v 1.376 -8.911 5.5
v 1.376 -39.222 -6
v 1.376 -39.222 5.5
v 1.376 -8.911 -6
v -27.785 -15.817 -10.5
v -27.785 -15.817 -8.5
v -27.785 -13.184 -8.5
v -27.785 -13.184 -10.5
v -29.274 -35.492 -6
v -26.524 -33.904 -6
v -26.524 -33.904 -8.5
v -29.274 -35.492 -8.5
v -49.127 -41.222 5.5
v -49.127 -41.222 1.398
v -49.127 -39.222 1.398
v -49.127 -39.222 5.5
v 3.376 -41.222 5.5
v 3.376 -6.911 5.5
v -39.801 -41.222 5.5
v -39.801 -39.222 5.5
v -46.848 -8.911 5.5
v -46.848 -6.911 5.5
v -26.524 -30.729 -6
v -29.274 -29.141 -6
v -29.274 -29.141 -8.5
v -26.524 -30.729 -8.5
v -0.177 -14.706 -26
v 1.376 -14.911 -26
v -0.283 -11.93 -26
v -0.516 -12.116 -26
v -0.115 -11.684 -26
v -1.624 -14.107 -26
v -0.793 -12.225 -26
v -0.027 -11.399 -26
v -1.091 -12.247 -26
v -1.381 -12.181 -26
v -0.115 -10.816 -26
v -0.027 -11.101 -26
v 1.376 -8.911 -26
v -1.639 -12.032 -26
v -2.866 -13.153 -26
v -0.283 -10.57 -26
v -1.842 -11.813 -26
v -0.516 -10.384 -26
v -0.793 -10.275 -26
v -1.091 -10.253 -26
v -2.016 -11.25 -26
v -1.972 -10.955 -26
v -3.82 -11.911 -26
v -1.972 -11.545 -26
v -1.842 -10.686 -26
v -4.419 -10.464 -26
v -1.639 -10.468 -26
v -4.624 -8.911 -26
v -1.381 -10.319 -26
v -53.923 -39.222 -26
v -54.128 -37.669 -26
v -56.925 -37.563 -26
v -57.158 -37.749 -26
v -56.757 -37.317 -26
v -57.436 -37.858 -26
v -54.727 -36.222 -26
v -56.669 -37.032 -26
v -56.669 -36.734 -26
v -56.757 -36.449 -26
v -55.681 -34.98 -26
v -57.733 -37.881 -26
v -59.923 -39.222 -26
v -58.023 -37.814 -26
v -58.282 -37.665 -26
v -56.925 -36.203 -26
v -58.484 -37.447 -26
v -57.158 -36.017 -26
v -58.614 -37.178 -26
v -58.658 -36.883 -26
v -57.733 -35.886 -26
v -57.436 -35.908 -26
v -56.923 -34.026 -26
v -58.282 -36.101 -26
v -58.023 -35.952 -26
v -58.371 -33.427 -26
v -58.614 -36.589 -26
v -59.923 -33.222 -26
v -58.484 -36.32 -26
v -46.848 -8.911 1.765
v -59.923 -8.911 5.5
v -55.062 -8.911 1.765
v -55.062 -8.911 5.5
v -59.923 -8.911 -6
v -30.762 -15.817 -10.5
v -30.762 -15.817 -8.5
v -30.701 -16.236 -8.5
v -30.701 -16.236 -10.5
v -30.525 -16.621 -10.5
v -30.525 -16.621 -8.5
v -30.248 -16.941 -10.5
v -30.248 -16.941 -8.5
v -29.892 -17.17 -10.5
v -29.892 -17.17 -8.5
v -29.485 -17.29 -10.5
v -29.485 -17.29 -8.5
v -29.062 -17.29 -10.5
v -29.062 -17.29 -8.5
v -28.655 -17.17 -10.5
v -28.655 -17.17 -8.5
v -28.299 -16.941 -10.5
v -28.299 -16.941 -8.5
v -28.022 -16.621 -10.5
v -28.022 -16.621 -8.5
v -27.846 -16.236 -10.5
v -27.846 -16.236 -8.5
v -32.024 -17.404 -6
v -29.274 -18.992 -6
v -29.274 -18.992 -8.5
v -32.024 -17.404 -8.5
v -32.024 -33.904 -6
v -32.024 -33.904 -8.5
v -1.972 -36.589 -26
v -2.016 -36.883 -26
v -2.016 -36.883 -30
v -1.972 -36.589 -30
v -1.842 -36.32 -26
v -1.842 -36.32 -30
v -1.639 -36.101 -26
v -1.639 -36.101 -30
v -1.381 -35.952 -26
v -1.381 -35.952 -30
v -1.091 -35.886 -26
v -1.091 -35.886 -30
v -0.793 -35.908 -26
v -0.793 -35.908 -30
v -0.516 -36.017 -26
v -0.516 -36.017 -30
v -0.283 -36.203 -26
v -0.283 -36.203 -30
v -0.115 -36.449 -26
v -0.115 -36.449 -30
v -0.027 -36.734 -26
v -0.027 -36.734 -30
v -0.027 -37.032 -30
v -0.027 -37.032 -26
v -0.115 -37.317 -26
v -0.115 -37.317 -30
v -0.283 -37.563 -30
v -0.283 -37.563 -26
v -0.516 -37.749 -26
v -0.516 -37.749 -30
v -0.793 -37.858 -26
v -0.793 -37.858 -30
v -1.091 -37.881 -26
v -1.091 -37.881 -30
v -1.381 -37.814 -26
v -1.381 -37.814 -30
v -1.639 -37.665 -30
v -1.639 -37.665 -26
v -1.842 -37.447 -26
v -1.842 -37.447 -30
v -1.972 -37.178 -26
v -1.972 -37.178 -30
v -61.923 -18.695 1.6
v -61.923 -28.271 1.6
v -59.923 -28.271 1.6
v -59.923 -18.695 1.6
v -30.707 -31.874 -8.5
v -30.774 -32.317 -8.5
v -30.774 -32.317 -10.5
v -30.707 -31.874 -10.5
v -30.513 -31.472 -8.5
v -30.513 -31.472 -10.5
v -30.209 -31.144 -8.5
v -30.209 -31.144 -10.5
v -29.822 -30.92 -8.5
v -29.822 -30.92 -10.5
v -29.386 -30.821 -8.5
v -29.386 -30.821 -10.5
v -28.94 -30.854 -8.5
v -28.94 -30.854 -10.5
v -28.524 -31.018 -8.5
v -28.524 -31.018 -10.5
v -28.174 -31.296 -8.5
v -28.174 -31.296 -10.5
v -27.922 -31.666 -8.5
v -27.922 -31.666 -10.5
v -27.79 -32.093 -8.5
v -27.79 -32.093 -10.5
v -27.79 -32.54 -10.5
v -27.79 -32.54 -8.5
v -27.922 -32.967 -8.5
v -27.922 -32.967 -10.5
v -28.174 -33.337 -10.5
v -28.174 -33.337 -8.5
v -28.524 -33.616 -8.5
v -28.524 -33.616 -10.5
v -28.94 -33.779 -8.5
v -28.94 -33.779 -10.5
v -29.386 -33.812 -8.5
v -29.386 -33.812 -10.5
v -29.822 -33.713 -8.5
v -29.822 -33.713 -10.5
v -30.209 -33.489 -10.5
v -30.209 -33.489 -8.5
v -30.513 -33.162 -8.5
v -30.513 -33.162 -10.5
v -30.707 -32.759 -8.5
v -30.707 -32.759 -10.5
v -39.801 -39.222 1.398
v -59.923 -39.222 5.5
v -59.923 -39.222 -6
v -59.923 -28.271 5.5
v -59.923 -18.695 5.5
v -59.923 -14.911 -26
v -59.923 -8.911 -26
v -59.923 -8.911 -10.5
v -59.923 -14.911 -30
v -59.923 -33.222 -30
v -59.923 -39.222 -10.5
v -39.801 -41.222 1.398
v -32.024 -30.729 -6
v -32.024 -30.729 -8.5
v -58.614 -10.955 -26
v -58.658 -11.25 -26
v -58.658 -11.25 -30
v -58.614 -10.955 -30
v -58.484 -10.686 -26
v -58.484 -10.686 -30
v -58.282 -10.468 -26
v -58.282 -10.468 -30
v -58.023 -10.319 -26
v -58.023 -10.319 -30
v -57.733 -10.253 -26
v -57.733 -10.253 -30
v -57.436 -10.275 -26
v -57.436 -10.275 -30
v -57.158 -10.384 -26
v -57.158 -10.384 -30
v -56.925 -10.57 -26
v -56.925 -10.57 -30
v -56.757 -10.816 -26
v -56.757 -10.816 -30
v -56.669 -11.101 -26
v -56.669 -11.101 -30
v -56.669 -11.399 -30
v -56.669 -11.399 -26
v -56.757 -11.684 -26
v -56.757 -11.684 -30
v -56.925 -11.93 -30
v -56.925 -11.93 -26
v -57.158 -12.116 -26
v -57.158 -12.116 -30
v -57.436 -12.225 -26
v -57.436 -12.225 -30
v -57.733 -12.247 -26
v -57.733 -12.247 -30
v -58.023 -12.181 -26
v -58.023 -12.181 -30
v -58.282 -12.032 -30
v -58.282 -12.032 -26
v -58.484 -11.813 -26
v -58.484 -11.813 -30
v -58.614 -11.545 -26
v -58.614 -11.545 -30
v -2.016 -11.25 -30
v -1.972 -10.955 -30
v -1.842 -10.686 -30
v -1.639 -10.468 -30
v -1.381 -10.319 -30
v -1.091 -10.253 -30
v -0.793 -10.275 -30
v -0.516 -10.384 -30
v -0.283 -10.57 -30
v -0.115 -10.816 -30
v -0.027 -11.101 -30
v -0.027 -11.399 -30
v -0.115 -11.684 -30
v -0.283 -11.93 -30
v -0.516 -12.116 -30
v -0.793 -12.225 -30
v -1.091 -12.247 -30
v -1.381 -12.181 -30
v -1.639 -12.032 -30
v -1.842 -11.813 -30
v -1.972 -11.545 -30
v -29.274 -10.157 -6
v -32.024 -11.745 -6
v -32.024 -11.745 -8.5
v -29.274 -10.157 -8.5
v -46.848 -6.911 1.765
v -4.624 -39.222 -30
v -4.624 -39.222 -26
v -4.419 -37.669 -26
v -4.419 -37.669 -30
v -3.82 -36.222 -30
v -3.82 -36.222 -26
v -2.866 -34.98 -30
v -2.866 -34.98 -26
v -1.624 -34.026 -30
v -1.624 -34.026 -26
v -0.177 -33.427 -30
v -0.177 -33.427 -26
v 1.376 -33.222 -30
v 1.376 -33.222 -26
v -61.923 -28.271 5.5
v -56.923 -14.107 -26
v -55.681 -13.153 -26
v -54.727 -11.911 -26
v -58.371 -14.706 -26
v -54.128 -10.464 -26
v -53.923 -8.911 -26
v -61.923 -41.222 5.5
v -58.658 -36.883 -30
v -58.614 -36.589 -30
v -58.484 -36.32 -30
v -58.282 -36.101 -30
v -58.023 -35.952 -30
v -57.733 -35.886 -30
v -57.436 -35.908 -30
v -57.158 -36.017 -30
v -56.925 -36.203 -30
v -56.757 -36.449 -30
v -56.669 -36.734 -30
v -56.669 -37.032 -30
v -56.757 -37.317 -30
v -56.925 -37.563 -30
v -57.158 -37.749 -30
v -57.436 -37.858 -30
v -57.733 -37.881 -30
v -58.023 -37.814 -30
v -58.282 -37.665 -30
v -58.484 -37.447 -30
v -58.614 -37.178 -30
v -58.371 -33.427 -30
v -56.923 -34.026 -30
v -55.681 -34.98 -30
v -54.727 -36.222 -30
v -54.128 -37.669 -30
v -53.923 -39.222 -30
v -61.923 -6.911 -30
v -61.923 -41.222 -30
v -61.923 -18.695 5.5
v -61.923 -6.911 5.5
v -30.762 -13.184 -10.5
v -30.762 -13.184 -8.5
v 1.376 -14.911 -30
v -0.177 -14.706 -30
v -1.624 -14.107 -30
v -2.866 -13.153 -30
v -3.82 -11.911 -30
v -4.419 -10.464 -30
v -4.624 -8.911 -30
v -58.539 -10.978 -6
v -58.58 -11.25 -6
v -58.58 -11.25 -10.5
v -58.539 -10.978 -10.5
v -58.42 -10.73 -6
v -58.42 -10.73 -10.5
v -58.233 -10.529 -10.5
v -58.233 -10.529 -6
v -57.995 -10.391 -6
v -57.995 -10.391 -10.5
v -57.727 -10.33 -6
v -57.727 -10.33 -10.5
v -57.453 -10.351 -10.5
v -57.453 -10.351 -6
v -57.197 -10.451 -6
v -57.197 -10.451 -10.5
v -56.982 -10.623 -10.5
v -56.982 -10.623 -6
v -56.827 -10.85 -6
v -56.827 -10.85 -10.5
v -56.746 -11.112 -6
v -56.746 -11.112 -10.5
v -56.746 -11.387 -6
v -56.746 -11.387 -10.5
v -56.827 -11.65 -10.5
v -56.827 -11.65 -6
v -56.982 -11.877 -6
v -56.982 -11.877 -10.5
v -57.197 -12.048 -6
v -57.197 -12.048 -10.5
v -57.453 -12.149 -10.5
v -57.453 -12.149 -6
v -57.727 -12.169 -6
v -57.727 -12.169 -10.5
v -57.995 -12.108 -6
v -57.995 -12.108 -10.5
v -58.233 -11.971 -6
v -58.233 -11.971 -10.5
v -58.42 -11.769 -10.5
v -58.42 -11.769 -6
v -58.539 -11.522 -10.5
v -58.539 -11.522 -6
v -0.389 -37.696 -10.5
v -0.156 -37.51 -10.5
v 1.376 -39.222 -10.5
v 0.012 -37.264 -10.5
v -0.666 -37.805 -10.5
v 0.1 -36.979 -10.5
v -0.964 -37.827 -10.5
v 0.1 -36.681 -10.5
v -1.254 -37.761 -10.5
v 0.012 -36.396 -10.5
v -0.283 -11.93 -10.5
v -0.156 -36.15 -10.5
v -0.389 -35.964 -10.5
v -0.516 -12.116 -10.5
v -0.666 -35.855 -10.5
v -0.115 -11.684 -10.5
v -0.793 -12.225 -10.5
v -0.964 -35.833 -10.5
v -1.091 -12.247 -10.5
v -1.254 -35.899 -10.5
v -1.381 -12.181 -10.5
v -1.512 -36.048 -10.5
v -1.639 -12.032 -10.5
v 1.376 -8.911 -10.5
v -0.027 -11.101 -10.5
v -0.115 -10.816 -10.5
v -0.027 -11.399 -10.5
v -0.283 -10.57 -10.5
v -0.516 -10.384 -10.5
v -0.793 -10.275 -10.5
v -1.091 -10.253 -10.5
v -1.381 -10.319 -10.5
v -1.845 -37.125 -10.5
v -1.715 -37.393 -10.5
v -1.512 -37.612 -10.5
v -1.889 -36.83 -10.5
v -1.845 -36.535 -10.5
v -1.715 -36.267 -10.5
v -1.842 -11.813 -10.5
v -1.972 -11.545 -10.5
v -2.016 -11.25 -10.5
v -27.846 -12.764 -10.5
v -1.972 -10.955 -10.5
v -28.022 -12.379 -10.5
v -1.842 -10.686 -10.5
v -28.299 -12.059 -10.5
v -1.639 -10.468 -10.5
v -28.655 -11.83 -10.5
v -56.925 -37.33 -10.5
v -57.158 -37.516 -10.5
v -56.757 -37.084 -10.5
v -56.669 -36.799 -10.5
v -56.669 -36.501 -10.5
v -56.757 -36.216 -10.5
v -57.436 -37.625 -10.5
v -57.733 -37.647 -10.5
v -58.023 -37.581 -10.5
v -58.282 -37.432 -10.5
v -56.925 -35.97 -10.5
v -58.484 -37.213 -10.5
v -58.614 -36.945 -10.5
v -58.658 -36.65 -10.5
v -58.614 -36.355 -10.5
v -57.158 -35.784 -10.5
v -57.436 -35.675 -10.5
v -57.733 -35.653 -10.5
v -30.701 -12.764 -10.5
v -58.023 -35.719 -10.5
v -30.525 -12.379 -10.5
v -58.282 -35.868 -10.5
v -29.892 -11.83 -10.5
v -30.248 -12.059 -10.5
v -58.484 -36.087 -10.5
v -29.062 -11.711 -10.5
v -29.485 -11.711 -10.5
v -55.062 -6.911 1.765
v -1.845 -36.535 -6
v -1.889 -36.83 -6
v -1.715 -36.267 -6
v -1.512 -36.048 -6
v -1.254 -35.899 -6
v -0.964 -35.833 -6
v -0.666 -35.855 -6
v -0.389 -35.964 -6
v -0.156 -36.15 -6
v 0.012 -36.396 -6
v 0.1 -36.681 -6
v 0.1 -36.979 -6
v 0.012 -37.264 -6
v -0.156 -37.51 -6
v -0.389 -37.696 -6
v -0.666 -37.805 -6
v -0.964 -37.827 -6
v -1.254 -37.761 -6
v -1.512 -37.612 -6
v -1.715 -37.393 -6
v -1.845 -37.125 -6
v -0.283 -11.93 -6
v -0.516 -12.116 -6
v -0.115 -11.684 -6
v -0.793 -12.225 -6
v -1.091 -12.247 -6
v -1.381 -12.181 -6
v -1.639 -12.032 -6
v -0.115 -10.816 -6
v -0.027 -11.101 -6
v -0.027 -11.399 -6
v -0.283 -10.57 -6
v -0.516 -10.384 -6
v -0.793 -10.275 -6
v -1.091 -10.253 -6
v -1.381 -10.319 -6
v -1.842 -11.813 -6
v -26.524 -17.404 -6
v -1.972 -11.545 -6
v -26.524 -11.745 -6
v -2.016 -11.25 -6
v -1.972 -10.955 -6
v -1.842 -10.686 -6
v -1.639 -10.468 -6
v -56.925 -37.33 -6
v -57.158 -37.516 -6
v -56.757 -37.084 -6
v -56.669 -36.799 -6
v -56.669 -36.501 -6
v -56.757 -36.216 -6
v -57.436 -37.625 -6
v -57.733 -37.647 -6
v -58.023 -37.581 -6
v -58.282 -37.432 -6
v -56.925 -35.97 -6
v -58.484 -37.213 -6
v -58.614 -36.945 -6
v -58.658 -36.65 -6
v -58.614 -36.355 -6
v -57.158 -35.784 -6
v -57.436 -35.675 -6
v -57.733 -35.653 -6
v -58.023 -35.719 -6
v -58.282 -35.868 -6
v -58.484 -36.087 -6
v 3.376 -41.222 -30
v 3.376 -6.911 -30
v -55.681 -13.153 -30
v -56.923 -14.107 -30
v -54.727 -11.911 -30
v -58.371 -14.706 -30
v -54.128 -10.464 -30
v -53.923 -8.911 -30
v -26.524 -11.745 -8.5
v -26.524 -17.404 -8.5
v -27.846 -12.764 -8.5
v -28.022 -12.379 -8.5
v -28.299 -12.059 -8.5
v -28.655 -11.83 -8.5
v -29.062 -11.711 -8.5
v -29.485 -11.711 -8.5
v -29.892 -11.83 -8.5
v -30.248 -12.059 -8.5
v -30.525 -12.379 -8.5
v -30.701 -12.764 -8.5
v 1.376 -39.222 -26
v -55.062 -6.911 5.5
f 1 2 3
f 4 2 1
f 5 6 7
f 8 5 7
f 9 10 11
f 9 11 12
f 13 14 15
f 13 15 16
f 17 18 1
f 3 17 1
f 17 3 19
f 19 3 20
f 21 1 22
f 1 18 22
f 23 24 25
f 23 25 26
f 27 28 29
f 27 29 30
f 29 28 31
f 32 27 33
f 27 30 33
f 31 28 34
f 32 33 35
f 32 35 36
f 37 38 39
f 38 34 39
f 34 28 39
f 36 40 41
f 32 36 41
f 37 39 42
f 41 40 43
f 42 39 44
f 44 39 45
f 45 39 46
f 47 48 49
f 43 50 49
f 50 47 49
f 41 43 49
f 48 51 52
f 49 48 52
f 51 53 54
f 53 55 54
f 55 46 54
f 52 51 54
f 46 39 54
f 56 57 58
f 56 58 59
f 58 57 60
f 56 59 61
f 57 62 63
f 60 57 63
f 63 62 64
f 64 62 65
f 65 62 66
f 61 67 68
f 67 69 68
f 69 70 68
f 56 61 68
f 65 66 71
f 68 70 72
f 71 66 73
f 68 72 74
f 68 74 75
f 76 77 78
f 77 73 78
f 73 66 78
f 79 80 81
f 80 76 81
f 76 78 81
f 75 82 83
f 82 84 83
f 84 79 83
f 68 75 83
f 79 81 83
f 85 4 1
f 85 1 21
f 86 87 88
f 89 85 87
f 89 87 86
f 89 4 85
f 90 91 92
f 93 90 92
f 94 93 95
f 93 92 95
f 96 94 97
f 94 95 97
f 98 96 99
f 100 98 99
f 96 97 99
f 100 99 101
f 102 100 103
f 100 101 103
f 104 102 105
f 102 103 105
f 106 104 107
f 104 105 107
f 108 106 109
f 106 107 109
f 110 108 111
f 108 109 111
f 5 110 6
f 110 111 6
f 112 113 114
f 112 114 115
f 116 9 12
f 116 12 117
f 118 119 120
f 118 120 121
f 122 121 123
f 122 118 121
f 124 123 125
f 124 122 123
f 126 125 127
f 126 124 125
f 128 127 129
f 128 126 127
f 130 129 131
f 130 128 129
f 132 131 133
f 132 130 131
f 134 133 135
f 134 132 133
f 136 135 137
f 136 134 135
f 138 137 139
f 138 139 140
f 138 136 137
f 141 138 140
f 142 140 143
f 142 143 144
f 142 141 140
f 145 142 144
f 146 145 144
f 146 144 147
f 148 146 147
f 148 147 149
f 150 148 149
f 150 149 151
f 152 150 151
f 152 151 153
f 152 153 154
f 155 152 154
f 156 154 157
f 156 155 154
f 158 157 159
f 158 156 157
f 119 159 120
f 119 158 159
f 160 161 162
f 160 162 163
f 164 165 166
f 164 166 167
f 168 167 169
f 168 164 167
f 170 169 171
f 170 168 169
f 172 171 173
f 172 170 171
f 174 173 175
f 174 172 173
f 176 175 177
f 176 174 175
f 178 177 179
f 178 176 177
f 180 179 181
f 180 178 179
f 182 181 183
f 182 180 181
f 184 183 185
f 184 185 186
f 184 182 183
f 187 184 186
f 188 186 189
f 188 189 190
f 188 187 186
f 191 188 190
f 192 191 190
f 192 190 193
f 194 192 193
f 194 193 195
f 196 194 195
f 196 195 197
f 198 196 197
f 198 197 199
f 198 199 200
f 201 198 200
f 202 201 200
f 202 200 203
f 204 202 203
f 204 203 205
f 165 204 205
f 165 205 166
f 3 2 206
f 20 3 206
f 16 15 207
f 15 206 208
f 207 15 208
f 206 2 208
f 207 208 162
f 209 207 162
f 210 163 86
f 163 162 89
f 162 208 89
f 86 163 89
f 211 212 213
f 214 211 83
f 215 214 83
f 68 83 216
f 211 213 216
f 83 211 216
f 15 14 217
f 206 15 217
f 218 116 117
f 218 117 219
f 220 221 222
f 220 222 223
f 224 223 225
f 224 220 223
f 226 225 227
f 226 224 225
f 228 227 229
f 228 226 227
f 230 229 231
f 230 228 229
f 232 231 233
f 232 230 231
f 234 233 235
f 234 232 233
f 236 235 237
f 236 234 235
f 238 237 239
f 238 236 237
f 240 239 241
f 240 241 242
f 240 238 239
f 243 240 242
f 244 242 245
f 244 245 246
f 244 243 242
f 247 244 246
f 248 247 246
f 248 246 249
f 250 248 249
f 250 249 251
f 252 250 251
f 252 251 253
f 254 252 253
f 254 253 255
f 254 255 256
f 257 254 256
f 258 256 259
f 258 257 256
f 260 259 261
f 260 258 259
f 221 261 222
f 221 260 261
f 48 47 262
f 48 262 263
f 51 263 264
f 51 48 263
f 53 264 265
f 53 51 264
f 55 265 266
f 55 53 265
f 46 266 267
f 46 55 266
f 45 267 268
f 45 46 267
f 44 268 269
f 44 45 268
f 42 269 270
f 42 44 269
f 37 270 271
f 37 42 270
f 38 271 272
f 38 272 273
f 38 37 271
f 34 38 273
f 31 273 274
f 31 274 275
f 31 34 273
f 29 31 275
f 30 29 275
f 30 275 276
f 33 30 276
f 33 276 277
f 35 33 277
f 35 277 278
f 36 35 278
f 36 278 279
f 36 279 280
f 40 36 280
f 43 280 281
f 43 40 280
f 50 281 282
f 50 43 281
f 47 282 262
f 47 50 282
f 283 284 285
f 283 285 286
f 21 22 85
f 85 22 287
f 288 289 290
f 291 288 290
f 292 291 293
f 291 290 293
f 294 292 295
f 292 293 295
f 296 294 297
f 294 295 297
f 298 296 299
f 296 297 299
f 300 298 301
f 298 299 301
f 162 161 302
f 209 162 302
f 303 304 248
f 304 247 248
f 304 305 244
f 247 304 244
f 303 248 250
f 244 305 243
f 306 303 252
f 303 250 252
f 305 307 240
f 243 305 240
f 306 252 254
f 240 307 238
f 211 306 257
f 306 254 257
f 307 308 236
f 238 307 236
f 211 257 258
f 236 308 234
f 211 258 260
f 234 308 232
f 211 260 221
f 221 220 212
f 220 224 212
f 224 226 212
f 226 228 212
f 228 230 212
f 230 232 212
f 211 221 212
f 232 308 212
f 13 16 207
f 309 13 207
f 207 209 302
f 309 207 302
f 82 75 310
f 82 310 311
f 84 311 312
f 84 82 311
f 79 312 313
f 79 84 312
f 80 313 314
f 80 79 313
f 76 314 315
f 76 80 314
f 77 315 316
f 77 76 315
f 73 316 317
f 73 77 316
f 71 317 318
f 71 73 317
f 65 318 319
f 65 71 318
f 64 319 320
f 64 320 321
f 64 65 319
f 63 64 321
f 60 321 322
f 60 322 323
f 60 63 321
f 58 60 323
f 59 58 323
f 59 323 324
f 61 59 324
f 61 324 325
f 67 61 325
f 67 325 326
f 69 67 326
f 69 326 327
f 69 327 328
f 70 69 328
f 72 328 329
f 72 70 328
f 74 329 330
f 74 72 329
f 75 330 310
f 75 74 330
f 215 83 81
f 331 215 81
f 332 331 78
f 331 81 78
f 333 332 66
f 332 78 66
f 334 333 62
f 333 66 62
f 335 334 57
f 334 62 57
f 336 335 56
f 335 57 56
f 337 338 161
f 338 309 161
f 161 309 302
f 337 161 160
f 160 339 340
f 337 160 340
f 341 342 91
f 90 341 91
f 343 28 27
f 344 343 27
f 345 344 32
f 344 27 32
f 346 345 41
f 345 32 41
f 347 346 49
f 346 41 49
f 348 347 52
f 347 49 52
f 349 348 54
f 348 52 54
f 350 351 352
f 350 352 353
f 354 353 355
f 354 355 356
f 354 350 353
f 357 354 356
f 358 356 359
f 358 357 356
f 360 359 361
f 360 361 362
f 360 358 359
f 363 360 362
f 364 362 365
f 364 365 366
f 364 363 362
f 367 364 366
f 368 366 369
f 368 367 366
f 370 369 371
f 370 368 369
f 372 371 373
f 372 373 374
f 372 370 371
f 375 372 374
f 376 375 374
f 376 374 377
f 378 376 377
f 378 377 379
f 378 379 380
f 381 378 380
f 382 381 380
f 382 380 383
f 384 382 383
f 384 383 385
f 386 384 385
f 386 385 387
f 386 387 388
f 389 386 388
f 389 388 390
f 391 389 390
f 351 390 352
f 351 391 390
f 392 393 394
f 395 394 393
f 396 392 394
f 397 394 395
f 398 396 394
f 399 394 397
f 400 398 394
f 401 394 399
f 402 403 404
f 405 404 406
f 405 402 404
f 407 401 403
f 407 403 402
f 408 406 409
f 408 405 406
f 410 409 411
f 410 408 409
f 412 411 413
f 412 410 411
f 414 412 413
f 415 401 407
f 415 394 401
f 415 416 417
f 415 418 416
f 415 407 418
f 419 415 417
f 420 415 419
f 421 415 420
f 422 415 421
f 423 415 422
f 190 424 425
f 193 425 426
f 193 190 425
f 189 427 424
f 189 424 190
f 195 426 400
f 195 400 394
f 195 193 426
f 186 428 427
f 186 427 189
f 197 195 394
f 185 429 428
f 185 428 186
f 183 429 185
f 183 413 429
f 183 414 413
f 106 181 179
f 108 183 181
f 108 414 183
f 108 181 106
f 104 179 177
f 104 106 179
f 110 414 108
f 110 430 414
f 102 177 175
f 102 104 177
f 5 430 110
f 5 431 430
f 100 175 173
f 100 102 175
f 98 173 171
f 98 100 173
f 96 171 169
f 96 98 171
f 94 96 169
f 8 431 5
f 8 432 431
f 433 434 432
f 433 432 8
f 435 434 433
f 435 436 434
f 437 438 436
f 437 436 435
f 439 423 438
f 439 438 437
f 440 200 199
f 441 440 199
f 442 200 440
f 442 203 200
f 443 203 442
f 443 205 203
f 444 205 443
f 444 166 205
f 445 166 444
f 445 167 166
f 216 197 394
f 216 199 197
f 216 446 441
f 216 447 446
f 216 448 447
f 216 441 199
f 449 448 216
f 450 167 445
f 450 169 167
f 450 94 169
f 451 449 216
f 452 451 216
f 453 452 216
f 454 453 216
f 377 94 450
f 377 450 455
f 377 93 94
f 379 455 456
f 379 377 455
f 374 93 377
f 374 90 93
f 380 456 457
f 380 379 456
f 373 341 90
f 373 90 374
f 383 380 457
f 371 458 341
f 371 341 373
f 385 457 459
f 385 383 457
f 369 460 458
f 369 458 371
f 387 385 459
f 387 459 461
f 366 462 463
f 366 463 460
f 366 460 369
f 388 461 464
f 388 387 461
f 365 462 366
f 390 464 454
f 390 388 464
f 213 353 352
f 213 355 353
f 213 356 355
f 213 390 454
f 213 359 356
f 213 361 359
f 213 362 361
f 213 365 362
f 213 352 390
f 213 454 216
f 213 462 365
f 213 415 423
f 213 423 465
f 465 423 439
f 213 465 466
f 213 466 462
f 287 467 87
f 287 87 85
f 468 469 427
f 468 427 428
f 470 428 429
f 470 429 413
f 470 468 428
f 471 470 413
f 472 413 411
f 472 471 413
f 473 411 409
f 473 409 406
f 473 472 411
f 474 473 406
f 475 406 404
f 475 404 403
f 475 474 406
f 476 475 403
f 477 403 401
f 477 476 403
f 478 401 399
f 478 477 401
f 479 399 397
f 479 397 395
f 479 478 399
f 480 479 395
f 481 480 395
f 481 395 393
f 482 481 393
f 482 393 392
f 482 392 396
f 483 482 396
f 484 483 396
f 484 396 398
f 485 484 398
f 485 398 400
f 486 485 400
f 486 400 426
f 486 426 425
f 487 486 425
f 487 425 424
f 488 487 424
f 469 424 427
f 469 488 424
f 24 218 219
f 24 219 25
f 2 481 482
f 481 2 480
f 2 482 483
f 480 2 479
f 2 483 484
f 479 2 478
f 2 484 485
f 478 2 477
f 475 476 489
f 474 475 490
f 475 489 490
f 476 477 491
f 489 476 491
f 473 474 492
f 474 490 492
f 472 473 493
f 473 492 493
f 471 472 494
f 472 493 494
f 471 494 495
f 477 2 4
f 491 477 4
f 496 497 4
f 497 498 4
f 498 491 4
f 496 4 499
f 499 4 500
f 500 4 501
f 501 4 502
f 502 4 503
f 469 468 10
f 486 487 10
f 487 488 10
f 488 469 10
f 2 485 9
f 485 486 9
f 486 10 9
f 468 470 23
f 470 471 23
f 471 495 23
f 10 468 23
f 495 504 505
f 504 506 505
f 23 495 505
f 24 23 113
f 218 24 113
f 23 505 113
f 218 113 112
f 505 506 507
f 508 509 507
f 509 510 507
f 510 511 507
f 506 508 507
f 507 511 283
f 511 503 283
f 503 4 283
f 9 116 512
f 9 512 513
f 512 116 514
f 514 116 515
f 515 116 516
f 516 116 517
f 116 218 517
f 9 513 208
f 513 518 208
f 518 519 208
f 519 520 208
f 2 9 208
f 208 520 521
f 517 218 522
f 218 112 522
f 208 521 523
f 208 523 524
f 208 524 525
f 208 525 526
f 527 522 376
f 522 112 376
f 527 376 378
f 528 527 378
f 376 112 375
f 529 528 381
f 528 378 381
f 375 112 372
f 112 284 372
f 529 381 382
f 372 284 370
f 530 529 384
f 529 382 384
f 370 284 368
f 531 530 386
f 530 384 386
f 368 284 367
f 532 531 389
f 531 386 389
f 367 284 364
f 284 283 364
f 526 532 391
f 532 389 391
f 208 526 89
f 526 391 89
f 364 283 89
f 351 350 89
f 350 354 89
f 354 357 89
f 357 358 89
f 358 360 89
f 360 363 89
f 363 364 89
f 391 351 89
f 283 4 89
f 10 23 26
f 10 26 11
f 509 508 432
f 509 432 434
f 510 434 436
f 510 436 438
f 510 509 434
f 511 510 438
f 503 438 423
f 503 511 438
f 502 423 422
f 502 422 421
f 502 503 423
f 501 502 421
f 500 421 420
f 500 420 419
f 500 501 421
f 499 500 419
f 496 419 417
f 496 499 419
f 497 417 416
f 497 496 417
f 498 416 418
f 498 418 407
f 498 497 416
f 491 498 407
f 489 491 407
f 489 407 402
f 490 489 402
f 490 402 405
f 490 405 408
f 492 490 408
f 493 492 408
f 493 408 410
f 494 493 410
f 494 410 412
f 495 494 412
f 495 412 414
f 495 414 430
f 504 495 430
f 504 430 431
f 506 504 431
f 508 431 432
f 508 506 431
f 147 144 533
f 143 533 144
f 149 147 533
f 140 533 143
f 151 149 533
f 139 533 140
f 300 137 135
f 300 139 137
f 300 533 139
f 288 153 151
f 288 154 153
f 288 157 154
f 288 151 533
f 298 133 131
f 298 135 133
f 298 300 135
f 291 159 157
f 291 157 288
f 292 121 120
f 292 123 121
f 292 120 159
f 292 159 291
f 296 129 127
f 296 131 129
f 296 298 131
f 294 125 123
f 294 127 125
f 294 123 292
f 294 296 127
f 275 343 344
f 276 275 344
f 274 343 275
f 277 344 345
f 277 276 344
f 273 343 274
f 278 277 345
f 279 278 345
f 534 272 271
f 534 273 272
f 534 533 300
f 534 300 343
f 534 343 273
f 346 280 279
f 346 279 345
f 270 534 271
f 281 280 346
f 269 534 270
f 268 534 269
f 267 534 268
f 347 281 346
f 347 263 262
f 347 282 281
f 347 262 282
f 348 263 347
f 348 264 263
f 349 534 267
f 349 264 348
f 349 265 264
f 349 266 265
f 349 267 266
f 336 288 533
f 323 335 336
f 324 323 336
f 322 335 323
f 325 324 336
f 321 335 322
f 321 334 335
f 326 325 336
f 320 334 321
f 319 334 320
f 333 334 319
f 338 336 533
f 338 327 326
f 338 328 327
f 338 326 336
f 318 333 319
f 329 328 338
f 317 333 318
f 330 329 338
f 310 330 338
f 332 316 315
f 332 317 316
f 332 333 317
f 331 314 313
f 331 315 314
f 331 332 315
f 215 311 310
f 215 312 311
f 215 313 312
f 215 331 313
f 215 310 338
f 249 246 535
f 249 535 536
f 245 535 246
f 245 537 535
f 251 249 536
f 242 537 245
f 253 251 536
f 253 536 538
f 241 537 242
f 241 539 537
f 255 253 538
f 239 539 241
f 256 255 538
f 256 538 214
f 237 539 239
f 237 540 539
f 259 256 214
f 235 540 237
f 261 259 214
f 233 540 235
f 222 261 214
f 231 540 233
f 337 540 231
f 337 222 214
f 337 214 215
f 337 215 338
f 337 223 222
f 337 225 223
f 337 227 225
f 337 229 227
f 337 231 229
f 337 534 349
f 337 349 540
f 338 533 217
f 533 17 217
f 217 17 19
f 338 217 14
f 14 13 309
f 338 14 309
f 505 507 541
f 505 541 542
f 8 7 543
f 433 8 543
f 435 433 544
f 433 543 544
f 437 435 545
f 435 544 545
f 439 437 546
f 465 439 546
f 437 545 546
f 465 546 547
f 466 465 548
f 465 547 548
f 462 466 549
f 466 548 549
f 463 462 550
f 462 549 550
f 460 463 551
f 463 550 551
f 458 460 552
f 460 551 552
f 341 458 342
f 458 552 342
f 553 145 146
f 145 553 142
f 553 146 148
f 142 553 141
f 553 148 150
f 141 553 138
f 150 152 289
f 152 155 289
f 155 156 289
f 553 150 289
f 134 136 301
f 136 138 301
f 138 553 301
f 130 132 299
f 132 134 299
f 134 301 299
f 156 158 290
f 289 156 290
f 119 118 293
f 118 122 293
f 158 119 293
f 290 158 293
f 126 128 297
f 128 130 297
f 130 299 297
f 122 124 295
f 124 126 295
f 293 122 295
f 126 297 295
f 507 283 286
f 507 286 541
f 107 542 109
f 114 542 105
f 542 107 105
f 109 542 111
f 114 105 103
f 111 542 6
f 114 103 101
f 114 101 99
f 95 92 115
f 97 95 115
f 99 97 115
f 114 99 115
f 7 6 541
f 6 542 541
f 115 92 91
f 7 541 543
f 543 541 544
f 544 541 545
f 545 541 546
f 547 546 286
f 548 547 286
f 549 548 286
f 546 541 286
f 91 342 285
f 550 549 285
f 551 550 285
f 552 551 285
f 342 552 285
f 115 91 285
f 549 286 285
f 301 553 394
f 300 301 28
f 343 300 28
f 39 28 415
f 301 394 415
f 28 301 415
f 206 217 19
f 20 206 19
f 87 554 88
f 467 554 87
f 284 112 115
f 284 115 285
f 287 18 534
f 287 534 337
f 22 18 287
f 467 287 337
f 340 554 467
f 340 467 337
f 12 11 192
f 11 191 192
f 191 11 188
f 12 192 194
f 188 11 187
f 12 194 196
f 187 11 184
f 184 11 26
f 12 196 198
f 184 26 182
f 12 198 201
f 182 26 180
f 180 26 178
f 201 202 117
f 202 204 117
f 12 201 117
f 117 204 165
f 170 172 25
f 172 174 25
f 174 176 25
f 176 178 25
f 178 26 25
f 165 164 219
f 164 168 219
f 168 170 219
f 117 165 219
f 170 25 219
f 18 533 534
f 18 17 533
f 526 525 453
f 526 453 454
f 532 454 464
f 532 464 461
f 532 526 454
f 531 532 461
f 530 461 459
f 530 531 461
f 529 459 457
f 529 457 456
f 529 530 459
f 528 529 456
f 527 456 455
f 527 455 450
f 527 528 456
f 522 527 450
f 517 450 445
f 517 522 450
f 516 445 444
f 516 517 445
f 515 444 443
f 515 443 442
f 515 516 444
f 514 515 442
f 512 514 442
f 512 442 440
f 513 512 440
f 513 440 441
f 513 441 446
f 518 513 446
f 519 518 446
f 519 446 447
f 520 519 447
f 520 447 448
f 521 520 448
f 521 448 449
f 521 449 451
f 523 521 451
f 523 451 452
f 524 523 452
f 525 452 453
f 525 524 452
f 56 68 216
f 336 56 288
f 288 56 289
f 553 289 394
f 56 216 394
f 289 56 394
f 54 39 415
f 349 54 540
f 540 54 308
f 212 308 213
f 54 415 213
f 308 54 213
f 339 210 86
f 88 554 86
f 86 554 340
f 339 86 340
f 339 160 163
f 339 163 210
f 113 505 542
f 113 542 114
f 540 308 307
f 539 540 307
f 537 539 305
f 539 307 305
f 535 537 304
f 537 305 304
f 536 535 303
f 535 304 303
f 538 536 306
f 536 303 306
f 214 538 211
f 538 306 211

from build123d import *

# Parameters (mm, degrees)
SKETCH_2_W           = 65.2997206
SKETCH_2_H           = 34.311658624
SKETCH_2_R           = 1.00000254
SKETCH_2_R_2         = 0.922218434
SKETCH_2_R_3         = 1.5
EXTRUDE_2_DEPTH      = 4.5
SKETCH_3_R           = 1.5
CUT_EXTRUDE_2_DEPTH  = 2.5
SKETCH_5_W           = 65.2997206
SKETCH_5_H           = 34.311658624
SKETCH_5_W_2         = 61.2997206
SKETCH_5_H_2         = 30.311658624
EXTRUDE_3_DEPTH      = 15.5
EXTRUDE_3_DEPTH_BACK = 16
SKETCH_7_W           = 8.214112973
SKETCH_7_H           = 3.795011114
CUT_EXTRUDE_4_DEPTH  = 3
SKETCH_8_W           = 4
SKETCH_8_H           = 9.575559499
CUT_EXTRUDE_5_DEPTH  = 3
SKETCH_9_W           = 9.326303795
SKETCH_9_H           = 4.202278939
CUT_EXTRUDE_6_DEPTH  = 3
SKETCH_10_W          = 65.2997206
SKETCH_10_H          = 34.311658624
SKETCH_10_R          = 1
EXTRUDE_4_DEPTH      = 4


with BuildPart() as part:
    # 草图2 → 凸台-拉伸2 (new body)
    with BuildSketch(Plane(origin=(0, 0, -6), x_dir=(-1, 0, 0), z_dir=(0, 0, -1))):
        with Locations((29.273558547, -24.066548133)):
            Rectangle(SKETCH_2_W, SKETCH_2_H)
        with Locations((1.016002032, -11.24978156)):
            Circle(SKETCH_2_R, mode=Mode.SUBTRACT)
        with Locations((0.889001778, -36.83007366)):
            Circle(SKETCH_2_R, mode=Mode.SUBTRACT)
        with Locations((57.658115316, -36.64983236)):
            Circle(SKETCH_2_R, mode=Mode.SUBTRACT)
        with Locations((57.658115316, -11.24978156)):
            Circle(SKETCH_2_R_2, mode=Mode.SUBTRACT)
        with Locations((29.273558547, -32.316548133)):
            Circle(SKETCH_2_R_3, mode=Mode.SUBTRACT)
        with BuildLine():
            Line((27.785407033, -15.816548133), (27.785407033, -13.183619987))
            ThreePointArc((27.785407033, -13.183619987), (29.273558547, -11.695468472), (30.761710061, -13.183619987))
            Line((30.761710061, -13.183619987), (30.761710061, -15.816548133))
            ThreePointArc((30.761710061, -15.816548133), (29.273558547, -17.304699647), (27.785407033, -15.816548133))
        make_face(mode=Mode.SUBTRACT)
    extrude(amount=EXTRUDE_2_DEPTH)

    # 草图3 → 切除-拉伸2 (cut)
    with BuildSketch(Plane(origin=(0, 0, -6), x_dir=(-1, 0, 0), z_dir=(0, 0, -1))):
        Polygon((29.273558547, -18.991974614), (32.023558547, -17.404261373), (32.023558547, -14.920341582), (32.023558547, -14.228834893), (32.023558547, -11.744915102), (29.273558547, -10.157201862), (26.523558547, -11.744915102), (26.523558547, -14.228834893), (26.523558547, -14.920341582), (26.523558547, -17.404261373), align=None)
        with BuildLine():
            ThreePointArc((30.761710061, -15.816548133), (29.273558547, -17.304699647), (27.785407033, -15.816548133))
            Line((27.785407033, -15.816548133), (27.785407033, -13.183619987))
            ThreePointArc((27.785407033, -13.183619987), (29.273558547, -11.695468472), (30.761710061, -13.183619987))
            Line((30.761710061, -13.183619987), (30.761710061, -15.816548133))
        make_face(mode=Mode.SUBTRACT)
        Polygon((26.523558547, -30.728834893), (26.523558547, -33.904261373), (29.273558547, -35.491974614), (32.023558547, -33.904261373), (32.023558547, -30.728834893), (29.273558547, -29.141121653), align=None)
        with Locations((29.273558547, -32.316548133)):
            Circle(SKETCH_3_R, mode=Mode.SUBTRACT)
    extrude(amount=CUT_EXTRUDE_2_DEPTH, mode=Mode.SUBTRACT)

    # 草图5 → 凸台-拉伸3 (add, two sides)
    with BuildSketch(Plane(origin=(0, 0, -10.5), x_dir=(-1, 0, 0), z_dir=(0, 0, -1))) as extrude_3_sk:
        with Locations((29.273558547, -24.066548133)):
            Rectangle(SKETCH_5_W, SKETCH_5_H)
        with Locations((29.273558547, -24.066548133)):
            Rectangle(SKETCH_5_W_2, SKETCH_5_H_2, mode=Mode.SUBTRACT)
    extrude(amount=EXTRUDE_3_DEPTH)
    extrude(extrude_3_sk.sketch, amount=-EXTRUDE_3_DEPTH_BACK)

    # 草图7 → 切除-拉伸4 (cut)
    with BuildSketch(Plane(origin=(0, -6.910718821, 0), x_dir=(1, 0, 0), z_dir=(0, 1, 0))):
        with Locations((-50.955145133, -3.662545243)):
            Rectangle(SKETCH_7_W, SKETCH_7_H)
    extrude(amount=-CUT_EXTRUDE_4_DEPTH, mode=Mode.SUBTRACT)

    # 草图8 → 切除-拉伸5 (cut)
    with BuildSketch(Plane.ZY.offset(61.923418847)):
        with Locations((3.6000508, -23.483057223)):
            Rectangle(SKETCH_8_W, SKETCH_8_H)
    extrude(amount=-CUT_EXTRUDE_5_DEPTH, mode=Mode.SUBTRACT)

    # 草图9 → 切除-拉伸6 (cut)
    with BuildSketch(Plane.XZ.offset(41.222377445)):
        with Locations((-44.464129124, 3.49891133)):
            Rectangle(SKETCH_9_W, SKETCH_9_H)
    extrude(amount=-CUT_EXTRUDE_6_DEPTH, mode=Mode.SUBTRACT)

    # 草图10 → 凸台-拉伸4 (add)
    with BuildSketch(Plane(origin=(0, 0, -26), x_dir=(-1, 0, 0), z_dir=(0, 0, -1))):
        with Locations((29.273558547, -24.066548133)):
            Rectangle(SKETCH_10_W, SKETCH_10_H)
        Polygon((-1.376301753, -14.910718821), (-1.376301753, -8.910718821), (4.623698247, -8.910718821), (53.923418847, -8.910718821), (59.923418847, -8.910718821), (59.923418847, -14.910718821), (59.923418847, -33.222377445), (59.923418847, -39.222377445), (53.923418847, -39.222377445), (4.623698247, -39.222377445), (-1.376301753, -39.222377445), (-1.376301753, -33.222377445), align=None, mode=Mode.SUBTRACT)
        with BuildLine():
            Line((4.623698247, -8.910718821), (-1.376301753, -8.910718821))
            Line((-1.376301753, -8.910718821), (-1.376301753, -14.910718821))
            ThreePointArc((-1.376301753, -14.910718821), (2.866338935, -13.153359509), (4.623698247, -8.910718821))
        make_face()
        with Locations((1.016002032, -11.24978156)):
            Circle(SKETCH_10_R, mode=Mode.SUBTRACT)
        with BuildLine():
            ThreePointArc((4.623698247, -39.222377445), (2.866338935, -34.979736758), (-1.376301753, -33.222377445))
            Line((-1.376301753, -33.222377445), (-1.376301753, -39.222377445))
            Line((-1.376301753, -39.222377445), (4.623698247, -39.222377445))
        make_face()
        with Locations((1.016002032, -36.883314707)):
            Circle(SKETCH_10_R, mode=Mode.SUBTRACT)
        with BuildLine():
            Line((59.923418847, -39.222377445), (59.923418847, -33.222377445))
            ThreePointArc((59.923418847, -33.222377445), (55.68077816, -34.979736758), (53.923418847, -39.222377445))
            Line((53.923418847, -39.222377445), (59.923418847, -39.222377445))
        make_face()
        with Locations((57.658115316, -36.883314707)):
            Circle(SKETCH_10_R, mode=Mode.SUBTRACT)
        with BuildLine():
            Line((59.923418847, -8.910718821), (53.923418847, -8.910718821))
            ThreePointArc((53.923418847, -8.910718821), (55.68077816, -13.153359509), (59.923418847, -14.910718821))
            Line((59.923418847, -14.910718821), (59.923418847, -8.910718821))
        make_face()
        with Locations((57.658115316, -11.24978156)):
            Circle(SKETCH_10_R, mode=Mode.SUBTRACT)
    extrude(amount=EXTRUDE_4_DEPTH)


solid = part.part
